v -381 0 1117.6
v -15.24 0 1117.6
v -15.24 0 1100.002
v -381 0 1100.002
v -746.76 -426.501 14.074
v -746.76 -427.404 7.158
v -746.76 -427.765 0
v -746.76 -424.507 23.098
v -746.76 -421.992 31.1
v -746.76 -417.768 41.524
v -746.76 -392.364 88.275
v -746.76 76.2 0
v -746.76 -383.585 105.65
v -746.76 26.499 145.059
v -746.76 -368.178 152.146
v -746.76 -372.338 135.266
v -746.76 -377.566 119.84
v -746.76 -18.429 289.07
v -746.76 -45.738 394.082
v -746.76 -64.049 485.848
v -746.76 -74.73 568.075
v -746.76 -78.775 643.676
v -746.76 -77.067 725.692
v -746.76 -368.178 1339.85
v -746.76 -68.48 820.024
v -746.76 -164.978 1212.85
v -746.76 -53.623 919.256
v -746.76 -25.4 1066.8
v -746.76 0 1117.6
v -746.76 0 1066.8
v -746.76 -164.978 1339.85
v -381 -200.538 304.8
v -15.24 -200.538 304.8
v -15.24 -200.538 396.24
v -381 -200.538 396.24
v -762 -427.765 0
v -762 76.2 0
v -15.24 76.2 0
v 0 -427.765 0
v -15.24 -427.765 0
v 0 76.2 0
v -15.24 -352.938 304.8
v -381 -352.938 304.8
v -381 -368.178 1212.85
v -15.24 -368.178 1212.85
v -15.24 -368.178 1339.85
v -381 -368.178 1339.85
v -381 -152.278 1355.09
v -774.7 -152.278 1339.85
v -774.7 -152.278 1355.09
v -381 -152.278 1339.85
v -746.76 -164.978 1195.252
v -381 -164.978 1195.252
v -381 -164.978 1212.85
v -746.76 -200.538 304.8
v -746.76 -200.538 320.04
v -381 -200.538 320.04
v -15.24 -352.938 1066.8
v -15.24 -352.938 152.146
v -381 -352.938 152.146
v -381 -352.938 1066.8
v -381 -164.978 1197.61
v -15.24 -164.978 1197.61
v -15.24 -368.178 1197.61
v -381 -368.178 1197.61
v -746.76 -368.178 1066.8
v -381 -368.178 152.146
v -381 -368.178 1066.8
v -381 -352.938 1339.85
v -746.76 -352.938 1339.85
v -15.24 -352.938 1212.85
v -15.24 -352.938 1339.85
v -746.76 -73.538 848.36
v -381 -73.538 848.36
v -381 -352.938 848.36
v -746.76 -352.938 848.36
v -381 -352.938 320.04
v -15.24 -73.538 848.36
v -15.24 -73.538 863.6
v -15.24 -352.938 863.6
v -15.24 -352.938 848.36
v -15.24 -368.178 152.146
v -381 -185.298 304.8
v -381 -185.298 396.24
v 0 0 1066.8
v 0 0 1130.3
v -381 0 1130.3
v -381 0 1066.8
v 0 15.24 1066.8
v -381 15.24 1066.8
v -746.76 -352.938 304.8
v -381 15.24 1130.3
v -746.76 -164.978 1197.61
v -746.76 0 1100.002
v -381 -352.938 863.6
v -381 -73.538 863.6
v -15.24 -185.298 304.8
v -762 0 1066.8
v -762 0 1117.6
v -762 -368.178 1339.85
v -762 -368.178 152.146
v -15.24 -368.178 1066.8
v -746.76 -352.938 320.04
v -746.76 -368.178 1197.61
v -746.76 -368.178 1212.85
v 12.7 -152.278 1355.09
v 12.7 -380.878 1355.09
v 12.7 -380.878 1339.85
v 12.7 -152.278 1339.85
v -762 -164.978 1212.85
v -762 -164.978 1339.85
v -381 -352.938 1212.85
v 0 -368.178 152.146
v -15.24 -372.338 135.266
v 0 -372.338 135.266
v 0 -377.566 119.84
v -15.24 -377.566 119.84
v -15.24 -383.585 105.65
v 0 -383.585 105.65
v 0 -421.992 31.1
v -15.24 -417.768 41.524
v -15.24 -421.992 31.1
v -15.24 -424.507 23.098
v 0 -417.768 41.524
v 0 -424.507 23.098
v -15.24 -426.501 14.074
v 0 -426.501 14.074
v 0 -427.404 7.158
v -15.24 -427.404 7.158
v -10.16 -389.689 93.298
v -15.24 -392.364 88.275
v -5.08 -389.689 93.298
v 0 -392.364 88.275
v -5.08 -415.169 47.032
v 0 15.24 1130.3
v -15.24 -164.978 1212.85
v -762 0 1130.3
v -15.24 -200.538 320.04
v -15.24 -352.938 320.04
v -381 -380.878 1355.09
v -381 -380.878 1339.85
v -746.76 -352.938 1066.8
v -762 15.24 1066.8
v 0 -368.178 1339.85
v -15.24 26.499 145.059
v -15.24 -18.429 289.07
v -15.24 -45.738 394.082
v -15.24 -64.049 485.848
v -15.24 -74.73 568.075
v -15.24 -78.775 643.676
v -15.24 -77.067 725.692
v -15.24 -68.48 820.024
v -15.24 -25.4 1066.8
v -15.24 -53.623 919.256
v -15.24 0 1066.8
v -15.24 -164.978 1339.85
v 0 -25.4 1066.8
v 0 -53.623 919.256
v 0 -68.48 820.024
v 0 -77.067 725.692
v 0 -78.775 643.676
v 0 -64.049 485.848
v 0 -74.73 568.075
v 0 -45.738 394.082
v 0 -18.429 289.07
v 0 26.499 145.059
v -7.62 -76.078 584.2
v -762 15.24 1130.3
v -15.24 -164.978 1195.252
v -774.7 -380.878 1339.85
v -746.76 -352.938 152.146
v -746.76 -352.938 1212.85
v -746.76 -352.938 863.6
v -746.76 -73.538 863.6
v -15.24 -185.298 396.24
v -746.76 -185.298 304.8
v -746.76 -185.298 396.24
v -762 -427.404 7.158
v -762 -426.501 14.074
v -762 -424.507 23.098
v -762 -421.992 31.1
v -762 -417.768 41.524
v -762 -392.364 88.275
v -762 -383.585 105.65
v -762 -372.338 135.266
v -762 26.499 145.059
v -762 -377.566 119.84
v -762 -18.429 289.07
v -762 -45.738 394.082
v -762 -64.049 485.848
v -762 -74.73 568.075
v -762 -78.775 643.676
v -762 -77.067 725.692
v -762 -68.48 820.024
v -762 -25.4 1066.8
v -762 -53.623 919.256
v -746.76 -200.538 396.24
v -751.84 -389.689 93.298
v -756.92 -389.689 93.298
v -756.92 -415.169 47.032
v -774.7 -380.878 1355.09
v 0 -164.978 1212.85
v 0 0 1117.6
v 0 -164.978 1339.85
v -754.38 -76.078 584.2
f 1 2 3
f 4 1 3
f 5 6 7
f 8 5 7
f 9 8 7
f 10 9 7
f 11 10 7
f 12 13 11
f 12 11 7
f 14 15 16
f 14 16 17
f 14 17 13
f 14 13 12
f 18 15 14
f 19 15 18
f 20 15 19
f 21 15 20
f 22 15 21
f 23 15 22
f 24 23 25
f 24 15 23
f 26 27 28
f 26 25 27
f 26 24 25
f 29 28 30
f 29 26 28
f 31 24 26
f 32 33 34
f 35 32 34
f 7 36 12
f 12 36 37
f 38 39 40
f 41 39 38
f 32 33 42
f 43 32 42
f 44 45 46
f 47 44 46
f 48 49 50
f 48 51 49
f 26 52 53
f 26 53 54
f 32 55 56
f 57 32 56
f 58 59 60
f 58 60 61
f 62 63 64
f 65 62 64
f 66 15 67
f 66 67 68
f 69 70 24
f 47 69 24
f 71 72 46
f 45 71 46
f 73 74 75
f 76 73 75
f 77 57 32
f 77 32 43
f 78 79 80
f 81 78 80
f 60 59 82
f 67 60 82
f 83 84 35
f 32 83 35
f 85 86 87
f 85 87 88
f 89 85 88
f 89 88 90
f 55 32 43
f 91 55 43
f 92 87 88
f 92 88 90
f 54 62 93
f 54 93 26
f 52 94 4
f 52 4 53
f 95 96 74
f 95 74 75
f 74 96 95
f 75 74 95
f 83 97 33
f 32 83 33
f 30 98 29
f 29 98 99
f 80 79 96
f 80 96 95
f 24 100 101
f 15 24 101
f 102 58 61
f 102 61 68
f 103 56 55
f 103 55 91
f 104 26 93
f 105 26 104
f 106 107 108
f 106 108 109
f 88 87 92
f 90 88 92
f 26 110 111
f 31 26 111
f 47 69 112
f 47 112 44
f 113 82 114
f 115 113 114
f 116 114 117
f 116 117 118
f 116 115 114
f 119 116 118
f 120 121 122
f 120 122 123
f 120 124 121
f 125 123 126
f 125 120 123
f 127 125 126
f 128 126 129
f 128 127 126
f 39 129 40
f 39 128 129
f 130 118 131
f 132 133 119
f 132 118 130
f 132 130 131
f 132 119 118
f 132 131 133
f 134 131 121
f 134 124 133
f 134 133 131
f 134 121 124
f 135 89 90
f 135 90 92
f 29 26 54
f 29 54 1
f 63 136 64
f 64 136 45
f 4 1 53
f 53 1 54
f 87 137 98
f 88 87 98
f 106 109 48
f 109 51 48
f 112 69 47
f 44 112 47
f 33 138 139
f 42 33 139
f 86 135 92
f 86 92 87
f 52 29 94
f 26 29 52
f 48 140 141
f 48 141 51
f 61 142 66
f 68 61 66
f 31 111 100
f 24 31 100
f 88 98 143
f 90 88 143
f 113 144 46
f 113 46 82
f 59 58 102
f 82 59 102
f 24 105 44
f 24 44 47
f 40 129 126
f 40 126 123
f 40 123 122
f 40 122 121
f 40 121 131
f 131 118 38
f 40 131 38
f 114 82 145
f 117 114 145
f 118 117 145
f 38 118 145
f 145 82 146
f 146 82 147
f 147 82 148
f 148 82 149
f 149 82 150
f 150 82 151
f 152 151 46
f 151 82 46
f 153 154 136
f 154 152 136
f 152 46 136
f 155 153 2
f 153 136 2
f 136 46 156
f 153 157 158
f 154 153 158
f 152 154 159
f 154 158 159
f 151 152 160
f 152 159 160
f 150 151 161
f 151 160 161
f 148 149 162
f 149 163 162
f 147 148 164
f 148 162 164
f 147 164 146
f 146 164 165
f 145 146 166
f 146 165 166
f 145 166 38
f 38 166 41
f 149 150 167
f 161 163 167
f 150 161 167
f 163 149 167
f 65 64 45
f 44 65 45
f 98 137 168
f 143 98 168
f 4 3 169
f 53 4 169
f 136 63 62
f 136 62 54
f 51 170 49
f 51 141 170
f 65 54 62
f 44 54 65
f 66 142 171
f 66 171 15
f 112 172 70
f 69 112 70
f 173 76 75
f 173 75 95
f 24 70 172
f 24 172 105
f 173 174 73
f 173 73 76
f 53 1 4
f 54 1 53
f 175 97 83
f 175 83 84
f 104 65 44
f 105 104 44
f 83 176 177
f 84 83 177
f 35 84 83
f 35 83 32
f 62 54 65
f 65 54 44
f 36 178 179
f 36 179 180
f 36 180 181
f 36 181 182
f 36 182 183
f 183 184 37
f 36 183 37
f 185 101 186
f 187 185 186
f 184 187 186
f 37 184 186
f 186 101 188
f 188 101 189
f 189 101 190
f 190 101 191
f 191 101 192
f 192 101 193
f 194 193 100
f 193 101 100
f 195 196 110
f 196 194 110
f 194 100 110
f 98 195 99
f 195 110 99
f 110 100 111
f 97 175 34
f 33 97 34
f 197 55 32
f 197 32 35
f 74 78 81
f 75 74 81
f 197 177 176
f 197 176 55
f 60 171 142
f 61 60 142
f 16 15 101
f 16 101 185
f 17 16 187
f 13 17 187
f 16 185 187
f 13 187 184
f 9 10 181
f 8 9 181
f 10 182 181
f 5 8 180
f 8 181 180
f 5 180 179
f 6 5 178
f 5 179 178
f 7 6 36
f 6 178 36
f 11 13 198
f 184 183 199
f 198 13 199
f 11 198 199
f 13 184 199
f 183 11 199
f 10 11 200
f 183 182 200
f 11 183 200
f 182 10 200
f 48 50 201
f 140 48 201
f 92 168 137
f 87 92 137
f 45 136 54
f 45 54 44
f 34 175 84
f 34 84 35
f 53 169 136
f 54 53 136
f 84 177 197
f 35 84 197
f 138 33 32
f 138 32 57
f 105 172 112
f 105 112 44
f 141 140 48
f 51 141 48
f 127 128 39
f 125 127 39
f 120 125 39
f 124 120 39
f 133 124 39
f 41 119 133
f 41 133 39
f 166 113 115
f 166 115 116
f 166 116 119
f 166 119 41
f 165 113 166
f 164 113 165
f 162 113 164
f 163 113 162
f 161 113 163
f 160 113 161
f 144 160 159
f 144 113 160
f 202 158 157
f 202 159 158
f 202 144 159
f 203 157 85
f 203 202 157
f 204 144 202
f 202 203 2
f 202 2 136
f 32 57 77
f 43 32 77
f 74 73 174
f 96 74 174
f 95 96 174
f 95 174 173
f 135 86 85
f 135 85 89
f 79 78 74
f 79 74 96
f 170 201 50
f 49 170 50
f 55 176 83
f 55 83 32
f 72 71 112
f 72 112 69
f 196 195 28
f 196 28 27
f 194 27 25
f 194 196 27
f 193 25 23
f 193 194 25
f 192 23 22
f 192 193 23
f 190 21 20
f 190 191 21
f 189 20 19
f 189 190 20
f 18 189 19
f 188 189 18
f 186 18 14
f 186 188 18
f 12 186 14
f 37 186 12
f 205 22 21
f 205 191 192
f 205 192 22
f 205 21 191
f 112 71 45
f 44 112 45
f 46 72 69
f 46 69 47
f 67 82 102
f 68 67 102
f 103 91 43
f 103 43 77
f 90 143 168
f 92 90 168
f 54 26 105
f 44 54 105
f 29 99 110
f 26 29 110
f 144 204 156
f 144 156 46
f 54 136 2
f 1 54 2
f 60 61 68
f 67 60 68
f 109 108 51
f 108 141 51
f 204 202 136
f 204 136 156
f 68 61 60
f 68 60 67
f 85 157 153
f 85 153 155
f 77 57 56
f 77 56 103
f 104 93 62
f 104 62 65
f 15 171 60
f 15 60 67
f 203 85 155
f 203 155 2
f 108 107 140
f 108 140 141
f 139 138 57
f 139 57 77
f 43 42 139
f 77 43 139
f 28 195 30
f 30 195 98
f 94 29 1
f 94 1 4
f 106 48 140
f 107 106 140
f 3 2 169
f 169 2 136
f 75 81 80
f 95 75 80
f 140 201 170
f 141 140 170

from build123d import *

# Parameters (mm, degrees)
F2_DEPTH       = 15.24
F4_DEPTH       = 381
F6_DEPTH       = 365.76
F7_W           = 203.2
F7_H           = 15.24
F8_DEPTH       = 365.76
F9_W           = 15.24
F9_H           = 127
F10_DEPTH      = 365.76
F12_DEPTH      = 381
F12_DEPTH_BACK = 12.7
F13_W          = 15.24
F13_H          = 914.6535638101
F14_DEPTH      = 365.76
F15_W          = 279.4
F15_H          = 15.24
F16_DEPTH      = 365.76
F17_W          = 152.4
F17_H          = 15.24
F18_DEPTH      = 365.76
F19_W          = 15.24
F19_H          = 91.44
F20_DEPTH      = 365.76


with BuildPart() as f2:
    # F1 (on Right) → F2 (new body)
    with BuildSketch(Plane.YZ):
        with BuildLine():
            Line((0, 1066.8), (0, 1117.6))
            Line((0, 1117.6), (-164.9778394209, 1212.85))
            Line((-164.9778394209, 1212.85), (-164.9778394209, 1339.85))
            Line((-164.9778394209, 1339.85), (-368.1778394209, 1339.85))
            Line((-368.1778394209, 1339.85), (-368.1778394209, 152.1464361899))
            add(Edge.make_bspline(
                [(-368.1778394209, 152.1464361899), (-382.086366415, 82.5592055917), (-427.2283613682, 51.862642169), (-427.7654417515, 0)],
                knots=[0, 0, 0, 0, 163.3989608192, 163.3989608192, 163.3989608192, 163.3989608192], degree=3))
            Line((-427.7654417515, 0), (-376.9654417515, 0))
            Line((-376.9654417515, 0), (0, 0))
            Line((0, 0), (76.2, 0))
            add(Edge.make_bspline(
                [(-25.4, 1066.8), (-57.0415458343, 909.1757988884), (-123.9763063255, 575.7363960136), (7.0910761644, 198.767393963), (76.2, 0)],
                knots=[0, 0, 0, 0, 0.4727221791, 1, 1, 1, 1], degree=3))
            Line((-25.4, 1066.8), (0, 1066.8))
        make_face()
    extrude(amount=-F2_DEPTH)


with BuildPart() as f4:
    # F3 (on Right) → F4 (new body, through all)
    with BuildSketch(Plane.YZ):
        Polygon((0, 1130.3), (0, 1117.6), (0, 1066.8), (15.24, 1066.8), (15.24, 1130.3), align=None)
    extrude(amount=-F4_DEPTH)


with BuildPart() as f6:
    # F5 (on face) → F6 (new body, through all)
    with BuildSketch(Plane(origin=(-15.24, 0, 0), x_dir=(0, -1, 0), z_dir=(-1, 0, 0))):
        Polygon((164.9778394209, 1212.85), (0, 1117.6), (0, 1100.0023637951), (164.9778394209, 1195.2523637951), align=None)
    extrude(amount=F6_DEPTH)


with BuildPart() as f8:
    # F7 (on face) → F8 (new body, through all)
    with BuildSketch(Plane(origin=(-15.24, 0, 0), x_dir=(0, -1, 0), z_dir=(-1, 0, 0))):
        with Locations((266.5778394209, 1205.23)):
            Rectangle(F7_W, F7_H)
    extrude(amount=F8_DEPTH)


with BuildPart() as f10:
    # F9 (on face) → F10 (new body, through all)
    with BuildSketch(Plane(origin=(-15.24, 0, 0), x_dir=(0, -1, 0), z_dir=(-1, 0, 0))):
        with Locations((360.5578394209, 1276.35)):
            Rectangle(F9_W, F9_H)
    extrude(amount=F10_DEPTH)


with BuildPart() as f12:
    # F11 (on face) → F12 (new body, two sides)
    with BuildSketch(Plane.YZ) as f12_sk:
        Polygon((-380.8778394209, 1355.09), (-380.8778394209, 1339.85), (-368.1778394209, 1339.85), (-164.9778394209, 1339.85), (-152.2778394209, 1339.85), (-152.2778394209, 1355.09), align=None)
    extrude(amount=-F12_DEPTH)
    extrude(f12_sk.sketch, amount=F12_DEPTH_BACK)


with BuildPart() as f14:
    # F13 (on face) → F14 (new body, through all)
    with BuildSketch(Plane(origin=(-15.24, 0, 0), x_dir=(0, -1, 0), z_dir=(-1, 0, 0))):
        with Locations((360.5578394209, 609.4732180949)):
            Rectangle(F13_W, F13_H)
    extrude(amount=F14_DEPTH)


with BuildPart() as f16:
    # F15 (on face) → F16 (new body, through all)
    with BuildSketch(Plane(origin=(-15.24, 0, 0), x_dir=(0, -1, 0), z_dir=(-1, 0, 0))):
        with Locations((213.2378394209, 855.98)):
            Rectangle(F15_W, F15_H)
    extrude(amount=F16_DEPTH)


with BuildPart() as f18:
    # F17 (on face) → F18 (new body, through all)
    with BuildSketch(Plane(origin=(-15.24, 0, 0), x_dir=(0, -1, 0), z_dir=(-1, 0, 0))):
        with Locations((276.7378394209, 312.42)):
            Rectangle(F17_W, F17_H)
    extrude(amount=F18_DEPTH)


with BuildPart() as f20:
    # F19 (on face) → F20 (new body, through all)
    with BuildSketch(Plane(origin=(-15.24, 0, 0), x_dir=(0, -1, 0), z_dir=(-1, 0, 0))):
        with Locations((192.9178394209, 350.52)):
            Rectangle(F19_W, F19_H)
    extrude(amount=F20_DEPTH)


with BuildPart() as f21_1:
    # F21: instance of F4
    add(f4.part.mirror(Plane.YZ.offset(-381)))


with BuildPart() as f21_2:
    # F21: instance of F6
    add(f6.part.mirror(Plane.YZ.offset(-381)))


with BuildPart() as f21_3:
    # F21: instance of F8
    add(f8.part.mirror(Plane.YZ.offset(-381)))


with BuildPart() as f21_4:
    # F21: instance of F10
    add(f10.part.mirror(Plane.YZ.offset(-381)))


with BuildPart() as f21_5:
    # F21: instance of F12
    add(f12.part.mirror(Plane.YZ.offset(-381)))


with BuildPart() as f21_6:
    # F21: instance of F14
    add(f14.part.mirror(Plane.YZ.offset(-381)))


with BuildPart() as f21_7:
    # F21: instance of F16
    add(f16.part.mirror(Plane.YZ.offset(-381)))


with BuildPart() as f21_8:
    # F21: instance of F18
    add(f18.part.mirror(Plane.YZ.offset(-381)))


with BuildPart() as f21_9:
    # F21: instance of F20
    add(f20.part.mirror(Plane.YZ.offset(-381)))


with BuildPart() as f21_10:
    # F21: instance of F2
    add(f2.part.mirror(Plane.YZ.offset(-381)))


solid = Compound([f2.part, f4.part, f6.part, f8.part, f10.part, f12.part, f14.part, f16.part, f18.part, f20.part, f21_1.part, f21_2.part, f21_3.part, f21_4.part, f21_5.part, f21_6.part, f21_7.part, f21_8.part, f21_9.part, f21_10.part])
